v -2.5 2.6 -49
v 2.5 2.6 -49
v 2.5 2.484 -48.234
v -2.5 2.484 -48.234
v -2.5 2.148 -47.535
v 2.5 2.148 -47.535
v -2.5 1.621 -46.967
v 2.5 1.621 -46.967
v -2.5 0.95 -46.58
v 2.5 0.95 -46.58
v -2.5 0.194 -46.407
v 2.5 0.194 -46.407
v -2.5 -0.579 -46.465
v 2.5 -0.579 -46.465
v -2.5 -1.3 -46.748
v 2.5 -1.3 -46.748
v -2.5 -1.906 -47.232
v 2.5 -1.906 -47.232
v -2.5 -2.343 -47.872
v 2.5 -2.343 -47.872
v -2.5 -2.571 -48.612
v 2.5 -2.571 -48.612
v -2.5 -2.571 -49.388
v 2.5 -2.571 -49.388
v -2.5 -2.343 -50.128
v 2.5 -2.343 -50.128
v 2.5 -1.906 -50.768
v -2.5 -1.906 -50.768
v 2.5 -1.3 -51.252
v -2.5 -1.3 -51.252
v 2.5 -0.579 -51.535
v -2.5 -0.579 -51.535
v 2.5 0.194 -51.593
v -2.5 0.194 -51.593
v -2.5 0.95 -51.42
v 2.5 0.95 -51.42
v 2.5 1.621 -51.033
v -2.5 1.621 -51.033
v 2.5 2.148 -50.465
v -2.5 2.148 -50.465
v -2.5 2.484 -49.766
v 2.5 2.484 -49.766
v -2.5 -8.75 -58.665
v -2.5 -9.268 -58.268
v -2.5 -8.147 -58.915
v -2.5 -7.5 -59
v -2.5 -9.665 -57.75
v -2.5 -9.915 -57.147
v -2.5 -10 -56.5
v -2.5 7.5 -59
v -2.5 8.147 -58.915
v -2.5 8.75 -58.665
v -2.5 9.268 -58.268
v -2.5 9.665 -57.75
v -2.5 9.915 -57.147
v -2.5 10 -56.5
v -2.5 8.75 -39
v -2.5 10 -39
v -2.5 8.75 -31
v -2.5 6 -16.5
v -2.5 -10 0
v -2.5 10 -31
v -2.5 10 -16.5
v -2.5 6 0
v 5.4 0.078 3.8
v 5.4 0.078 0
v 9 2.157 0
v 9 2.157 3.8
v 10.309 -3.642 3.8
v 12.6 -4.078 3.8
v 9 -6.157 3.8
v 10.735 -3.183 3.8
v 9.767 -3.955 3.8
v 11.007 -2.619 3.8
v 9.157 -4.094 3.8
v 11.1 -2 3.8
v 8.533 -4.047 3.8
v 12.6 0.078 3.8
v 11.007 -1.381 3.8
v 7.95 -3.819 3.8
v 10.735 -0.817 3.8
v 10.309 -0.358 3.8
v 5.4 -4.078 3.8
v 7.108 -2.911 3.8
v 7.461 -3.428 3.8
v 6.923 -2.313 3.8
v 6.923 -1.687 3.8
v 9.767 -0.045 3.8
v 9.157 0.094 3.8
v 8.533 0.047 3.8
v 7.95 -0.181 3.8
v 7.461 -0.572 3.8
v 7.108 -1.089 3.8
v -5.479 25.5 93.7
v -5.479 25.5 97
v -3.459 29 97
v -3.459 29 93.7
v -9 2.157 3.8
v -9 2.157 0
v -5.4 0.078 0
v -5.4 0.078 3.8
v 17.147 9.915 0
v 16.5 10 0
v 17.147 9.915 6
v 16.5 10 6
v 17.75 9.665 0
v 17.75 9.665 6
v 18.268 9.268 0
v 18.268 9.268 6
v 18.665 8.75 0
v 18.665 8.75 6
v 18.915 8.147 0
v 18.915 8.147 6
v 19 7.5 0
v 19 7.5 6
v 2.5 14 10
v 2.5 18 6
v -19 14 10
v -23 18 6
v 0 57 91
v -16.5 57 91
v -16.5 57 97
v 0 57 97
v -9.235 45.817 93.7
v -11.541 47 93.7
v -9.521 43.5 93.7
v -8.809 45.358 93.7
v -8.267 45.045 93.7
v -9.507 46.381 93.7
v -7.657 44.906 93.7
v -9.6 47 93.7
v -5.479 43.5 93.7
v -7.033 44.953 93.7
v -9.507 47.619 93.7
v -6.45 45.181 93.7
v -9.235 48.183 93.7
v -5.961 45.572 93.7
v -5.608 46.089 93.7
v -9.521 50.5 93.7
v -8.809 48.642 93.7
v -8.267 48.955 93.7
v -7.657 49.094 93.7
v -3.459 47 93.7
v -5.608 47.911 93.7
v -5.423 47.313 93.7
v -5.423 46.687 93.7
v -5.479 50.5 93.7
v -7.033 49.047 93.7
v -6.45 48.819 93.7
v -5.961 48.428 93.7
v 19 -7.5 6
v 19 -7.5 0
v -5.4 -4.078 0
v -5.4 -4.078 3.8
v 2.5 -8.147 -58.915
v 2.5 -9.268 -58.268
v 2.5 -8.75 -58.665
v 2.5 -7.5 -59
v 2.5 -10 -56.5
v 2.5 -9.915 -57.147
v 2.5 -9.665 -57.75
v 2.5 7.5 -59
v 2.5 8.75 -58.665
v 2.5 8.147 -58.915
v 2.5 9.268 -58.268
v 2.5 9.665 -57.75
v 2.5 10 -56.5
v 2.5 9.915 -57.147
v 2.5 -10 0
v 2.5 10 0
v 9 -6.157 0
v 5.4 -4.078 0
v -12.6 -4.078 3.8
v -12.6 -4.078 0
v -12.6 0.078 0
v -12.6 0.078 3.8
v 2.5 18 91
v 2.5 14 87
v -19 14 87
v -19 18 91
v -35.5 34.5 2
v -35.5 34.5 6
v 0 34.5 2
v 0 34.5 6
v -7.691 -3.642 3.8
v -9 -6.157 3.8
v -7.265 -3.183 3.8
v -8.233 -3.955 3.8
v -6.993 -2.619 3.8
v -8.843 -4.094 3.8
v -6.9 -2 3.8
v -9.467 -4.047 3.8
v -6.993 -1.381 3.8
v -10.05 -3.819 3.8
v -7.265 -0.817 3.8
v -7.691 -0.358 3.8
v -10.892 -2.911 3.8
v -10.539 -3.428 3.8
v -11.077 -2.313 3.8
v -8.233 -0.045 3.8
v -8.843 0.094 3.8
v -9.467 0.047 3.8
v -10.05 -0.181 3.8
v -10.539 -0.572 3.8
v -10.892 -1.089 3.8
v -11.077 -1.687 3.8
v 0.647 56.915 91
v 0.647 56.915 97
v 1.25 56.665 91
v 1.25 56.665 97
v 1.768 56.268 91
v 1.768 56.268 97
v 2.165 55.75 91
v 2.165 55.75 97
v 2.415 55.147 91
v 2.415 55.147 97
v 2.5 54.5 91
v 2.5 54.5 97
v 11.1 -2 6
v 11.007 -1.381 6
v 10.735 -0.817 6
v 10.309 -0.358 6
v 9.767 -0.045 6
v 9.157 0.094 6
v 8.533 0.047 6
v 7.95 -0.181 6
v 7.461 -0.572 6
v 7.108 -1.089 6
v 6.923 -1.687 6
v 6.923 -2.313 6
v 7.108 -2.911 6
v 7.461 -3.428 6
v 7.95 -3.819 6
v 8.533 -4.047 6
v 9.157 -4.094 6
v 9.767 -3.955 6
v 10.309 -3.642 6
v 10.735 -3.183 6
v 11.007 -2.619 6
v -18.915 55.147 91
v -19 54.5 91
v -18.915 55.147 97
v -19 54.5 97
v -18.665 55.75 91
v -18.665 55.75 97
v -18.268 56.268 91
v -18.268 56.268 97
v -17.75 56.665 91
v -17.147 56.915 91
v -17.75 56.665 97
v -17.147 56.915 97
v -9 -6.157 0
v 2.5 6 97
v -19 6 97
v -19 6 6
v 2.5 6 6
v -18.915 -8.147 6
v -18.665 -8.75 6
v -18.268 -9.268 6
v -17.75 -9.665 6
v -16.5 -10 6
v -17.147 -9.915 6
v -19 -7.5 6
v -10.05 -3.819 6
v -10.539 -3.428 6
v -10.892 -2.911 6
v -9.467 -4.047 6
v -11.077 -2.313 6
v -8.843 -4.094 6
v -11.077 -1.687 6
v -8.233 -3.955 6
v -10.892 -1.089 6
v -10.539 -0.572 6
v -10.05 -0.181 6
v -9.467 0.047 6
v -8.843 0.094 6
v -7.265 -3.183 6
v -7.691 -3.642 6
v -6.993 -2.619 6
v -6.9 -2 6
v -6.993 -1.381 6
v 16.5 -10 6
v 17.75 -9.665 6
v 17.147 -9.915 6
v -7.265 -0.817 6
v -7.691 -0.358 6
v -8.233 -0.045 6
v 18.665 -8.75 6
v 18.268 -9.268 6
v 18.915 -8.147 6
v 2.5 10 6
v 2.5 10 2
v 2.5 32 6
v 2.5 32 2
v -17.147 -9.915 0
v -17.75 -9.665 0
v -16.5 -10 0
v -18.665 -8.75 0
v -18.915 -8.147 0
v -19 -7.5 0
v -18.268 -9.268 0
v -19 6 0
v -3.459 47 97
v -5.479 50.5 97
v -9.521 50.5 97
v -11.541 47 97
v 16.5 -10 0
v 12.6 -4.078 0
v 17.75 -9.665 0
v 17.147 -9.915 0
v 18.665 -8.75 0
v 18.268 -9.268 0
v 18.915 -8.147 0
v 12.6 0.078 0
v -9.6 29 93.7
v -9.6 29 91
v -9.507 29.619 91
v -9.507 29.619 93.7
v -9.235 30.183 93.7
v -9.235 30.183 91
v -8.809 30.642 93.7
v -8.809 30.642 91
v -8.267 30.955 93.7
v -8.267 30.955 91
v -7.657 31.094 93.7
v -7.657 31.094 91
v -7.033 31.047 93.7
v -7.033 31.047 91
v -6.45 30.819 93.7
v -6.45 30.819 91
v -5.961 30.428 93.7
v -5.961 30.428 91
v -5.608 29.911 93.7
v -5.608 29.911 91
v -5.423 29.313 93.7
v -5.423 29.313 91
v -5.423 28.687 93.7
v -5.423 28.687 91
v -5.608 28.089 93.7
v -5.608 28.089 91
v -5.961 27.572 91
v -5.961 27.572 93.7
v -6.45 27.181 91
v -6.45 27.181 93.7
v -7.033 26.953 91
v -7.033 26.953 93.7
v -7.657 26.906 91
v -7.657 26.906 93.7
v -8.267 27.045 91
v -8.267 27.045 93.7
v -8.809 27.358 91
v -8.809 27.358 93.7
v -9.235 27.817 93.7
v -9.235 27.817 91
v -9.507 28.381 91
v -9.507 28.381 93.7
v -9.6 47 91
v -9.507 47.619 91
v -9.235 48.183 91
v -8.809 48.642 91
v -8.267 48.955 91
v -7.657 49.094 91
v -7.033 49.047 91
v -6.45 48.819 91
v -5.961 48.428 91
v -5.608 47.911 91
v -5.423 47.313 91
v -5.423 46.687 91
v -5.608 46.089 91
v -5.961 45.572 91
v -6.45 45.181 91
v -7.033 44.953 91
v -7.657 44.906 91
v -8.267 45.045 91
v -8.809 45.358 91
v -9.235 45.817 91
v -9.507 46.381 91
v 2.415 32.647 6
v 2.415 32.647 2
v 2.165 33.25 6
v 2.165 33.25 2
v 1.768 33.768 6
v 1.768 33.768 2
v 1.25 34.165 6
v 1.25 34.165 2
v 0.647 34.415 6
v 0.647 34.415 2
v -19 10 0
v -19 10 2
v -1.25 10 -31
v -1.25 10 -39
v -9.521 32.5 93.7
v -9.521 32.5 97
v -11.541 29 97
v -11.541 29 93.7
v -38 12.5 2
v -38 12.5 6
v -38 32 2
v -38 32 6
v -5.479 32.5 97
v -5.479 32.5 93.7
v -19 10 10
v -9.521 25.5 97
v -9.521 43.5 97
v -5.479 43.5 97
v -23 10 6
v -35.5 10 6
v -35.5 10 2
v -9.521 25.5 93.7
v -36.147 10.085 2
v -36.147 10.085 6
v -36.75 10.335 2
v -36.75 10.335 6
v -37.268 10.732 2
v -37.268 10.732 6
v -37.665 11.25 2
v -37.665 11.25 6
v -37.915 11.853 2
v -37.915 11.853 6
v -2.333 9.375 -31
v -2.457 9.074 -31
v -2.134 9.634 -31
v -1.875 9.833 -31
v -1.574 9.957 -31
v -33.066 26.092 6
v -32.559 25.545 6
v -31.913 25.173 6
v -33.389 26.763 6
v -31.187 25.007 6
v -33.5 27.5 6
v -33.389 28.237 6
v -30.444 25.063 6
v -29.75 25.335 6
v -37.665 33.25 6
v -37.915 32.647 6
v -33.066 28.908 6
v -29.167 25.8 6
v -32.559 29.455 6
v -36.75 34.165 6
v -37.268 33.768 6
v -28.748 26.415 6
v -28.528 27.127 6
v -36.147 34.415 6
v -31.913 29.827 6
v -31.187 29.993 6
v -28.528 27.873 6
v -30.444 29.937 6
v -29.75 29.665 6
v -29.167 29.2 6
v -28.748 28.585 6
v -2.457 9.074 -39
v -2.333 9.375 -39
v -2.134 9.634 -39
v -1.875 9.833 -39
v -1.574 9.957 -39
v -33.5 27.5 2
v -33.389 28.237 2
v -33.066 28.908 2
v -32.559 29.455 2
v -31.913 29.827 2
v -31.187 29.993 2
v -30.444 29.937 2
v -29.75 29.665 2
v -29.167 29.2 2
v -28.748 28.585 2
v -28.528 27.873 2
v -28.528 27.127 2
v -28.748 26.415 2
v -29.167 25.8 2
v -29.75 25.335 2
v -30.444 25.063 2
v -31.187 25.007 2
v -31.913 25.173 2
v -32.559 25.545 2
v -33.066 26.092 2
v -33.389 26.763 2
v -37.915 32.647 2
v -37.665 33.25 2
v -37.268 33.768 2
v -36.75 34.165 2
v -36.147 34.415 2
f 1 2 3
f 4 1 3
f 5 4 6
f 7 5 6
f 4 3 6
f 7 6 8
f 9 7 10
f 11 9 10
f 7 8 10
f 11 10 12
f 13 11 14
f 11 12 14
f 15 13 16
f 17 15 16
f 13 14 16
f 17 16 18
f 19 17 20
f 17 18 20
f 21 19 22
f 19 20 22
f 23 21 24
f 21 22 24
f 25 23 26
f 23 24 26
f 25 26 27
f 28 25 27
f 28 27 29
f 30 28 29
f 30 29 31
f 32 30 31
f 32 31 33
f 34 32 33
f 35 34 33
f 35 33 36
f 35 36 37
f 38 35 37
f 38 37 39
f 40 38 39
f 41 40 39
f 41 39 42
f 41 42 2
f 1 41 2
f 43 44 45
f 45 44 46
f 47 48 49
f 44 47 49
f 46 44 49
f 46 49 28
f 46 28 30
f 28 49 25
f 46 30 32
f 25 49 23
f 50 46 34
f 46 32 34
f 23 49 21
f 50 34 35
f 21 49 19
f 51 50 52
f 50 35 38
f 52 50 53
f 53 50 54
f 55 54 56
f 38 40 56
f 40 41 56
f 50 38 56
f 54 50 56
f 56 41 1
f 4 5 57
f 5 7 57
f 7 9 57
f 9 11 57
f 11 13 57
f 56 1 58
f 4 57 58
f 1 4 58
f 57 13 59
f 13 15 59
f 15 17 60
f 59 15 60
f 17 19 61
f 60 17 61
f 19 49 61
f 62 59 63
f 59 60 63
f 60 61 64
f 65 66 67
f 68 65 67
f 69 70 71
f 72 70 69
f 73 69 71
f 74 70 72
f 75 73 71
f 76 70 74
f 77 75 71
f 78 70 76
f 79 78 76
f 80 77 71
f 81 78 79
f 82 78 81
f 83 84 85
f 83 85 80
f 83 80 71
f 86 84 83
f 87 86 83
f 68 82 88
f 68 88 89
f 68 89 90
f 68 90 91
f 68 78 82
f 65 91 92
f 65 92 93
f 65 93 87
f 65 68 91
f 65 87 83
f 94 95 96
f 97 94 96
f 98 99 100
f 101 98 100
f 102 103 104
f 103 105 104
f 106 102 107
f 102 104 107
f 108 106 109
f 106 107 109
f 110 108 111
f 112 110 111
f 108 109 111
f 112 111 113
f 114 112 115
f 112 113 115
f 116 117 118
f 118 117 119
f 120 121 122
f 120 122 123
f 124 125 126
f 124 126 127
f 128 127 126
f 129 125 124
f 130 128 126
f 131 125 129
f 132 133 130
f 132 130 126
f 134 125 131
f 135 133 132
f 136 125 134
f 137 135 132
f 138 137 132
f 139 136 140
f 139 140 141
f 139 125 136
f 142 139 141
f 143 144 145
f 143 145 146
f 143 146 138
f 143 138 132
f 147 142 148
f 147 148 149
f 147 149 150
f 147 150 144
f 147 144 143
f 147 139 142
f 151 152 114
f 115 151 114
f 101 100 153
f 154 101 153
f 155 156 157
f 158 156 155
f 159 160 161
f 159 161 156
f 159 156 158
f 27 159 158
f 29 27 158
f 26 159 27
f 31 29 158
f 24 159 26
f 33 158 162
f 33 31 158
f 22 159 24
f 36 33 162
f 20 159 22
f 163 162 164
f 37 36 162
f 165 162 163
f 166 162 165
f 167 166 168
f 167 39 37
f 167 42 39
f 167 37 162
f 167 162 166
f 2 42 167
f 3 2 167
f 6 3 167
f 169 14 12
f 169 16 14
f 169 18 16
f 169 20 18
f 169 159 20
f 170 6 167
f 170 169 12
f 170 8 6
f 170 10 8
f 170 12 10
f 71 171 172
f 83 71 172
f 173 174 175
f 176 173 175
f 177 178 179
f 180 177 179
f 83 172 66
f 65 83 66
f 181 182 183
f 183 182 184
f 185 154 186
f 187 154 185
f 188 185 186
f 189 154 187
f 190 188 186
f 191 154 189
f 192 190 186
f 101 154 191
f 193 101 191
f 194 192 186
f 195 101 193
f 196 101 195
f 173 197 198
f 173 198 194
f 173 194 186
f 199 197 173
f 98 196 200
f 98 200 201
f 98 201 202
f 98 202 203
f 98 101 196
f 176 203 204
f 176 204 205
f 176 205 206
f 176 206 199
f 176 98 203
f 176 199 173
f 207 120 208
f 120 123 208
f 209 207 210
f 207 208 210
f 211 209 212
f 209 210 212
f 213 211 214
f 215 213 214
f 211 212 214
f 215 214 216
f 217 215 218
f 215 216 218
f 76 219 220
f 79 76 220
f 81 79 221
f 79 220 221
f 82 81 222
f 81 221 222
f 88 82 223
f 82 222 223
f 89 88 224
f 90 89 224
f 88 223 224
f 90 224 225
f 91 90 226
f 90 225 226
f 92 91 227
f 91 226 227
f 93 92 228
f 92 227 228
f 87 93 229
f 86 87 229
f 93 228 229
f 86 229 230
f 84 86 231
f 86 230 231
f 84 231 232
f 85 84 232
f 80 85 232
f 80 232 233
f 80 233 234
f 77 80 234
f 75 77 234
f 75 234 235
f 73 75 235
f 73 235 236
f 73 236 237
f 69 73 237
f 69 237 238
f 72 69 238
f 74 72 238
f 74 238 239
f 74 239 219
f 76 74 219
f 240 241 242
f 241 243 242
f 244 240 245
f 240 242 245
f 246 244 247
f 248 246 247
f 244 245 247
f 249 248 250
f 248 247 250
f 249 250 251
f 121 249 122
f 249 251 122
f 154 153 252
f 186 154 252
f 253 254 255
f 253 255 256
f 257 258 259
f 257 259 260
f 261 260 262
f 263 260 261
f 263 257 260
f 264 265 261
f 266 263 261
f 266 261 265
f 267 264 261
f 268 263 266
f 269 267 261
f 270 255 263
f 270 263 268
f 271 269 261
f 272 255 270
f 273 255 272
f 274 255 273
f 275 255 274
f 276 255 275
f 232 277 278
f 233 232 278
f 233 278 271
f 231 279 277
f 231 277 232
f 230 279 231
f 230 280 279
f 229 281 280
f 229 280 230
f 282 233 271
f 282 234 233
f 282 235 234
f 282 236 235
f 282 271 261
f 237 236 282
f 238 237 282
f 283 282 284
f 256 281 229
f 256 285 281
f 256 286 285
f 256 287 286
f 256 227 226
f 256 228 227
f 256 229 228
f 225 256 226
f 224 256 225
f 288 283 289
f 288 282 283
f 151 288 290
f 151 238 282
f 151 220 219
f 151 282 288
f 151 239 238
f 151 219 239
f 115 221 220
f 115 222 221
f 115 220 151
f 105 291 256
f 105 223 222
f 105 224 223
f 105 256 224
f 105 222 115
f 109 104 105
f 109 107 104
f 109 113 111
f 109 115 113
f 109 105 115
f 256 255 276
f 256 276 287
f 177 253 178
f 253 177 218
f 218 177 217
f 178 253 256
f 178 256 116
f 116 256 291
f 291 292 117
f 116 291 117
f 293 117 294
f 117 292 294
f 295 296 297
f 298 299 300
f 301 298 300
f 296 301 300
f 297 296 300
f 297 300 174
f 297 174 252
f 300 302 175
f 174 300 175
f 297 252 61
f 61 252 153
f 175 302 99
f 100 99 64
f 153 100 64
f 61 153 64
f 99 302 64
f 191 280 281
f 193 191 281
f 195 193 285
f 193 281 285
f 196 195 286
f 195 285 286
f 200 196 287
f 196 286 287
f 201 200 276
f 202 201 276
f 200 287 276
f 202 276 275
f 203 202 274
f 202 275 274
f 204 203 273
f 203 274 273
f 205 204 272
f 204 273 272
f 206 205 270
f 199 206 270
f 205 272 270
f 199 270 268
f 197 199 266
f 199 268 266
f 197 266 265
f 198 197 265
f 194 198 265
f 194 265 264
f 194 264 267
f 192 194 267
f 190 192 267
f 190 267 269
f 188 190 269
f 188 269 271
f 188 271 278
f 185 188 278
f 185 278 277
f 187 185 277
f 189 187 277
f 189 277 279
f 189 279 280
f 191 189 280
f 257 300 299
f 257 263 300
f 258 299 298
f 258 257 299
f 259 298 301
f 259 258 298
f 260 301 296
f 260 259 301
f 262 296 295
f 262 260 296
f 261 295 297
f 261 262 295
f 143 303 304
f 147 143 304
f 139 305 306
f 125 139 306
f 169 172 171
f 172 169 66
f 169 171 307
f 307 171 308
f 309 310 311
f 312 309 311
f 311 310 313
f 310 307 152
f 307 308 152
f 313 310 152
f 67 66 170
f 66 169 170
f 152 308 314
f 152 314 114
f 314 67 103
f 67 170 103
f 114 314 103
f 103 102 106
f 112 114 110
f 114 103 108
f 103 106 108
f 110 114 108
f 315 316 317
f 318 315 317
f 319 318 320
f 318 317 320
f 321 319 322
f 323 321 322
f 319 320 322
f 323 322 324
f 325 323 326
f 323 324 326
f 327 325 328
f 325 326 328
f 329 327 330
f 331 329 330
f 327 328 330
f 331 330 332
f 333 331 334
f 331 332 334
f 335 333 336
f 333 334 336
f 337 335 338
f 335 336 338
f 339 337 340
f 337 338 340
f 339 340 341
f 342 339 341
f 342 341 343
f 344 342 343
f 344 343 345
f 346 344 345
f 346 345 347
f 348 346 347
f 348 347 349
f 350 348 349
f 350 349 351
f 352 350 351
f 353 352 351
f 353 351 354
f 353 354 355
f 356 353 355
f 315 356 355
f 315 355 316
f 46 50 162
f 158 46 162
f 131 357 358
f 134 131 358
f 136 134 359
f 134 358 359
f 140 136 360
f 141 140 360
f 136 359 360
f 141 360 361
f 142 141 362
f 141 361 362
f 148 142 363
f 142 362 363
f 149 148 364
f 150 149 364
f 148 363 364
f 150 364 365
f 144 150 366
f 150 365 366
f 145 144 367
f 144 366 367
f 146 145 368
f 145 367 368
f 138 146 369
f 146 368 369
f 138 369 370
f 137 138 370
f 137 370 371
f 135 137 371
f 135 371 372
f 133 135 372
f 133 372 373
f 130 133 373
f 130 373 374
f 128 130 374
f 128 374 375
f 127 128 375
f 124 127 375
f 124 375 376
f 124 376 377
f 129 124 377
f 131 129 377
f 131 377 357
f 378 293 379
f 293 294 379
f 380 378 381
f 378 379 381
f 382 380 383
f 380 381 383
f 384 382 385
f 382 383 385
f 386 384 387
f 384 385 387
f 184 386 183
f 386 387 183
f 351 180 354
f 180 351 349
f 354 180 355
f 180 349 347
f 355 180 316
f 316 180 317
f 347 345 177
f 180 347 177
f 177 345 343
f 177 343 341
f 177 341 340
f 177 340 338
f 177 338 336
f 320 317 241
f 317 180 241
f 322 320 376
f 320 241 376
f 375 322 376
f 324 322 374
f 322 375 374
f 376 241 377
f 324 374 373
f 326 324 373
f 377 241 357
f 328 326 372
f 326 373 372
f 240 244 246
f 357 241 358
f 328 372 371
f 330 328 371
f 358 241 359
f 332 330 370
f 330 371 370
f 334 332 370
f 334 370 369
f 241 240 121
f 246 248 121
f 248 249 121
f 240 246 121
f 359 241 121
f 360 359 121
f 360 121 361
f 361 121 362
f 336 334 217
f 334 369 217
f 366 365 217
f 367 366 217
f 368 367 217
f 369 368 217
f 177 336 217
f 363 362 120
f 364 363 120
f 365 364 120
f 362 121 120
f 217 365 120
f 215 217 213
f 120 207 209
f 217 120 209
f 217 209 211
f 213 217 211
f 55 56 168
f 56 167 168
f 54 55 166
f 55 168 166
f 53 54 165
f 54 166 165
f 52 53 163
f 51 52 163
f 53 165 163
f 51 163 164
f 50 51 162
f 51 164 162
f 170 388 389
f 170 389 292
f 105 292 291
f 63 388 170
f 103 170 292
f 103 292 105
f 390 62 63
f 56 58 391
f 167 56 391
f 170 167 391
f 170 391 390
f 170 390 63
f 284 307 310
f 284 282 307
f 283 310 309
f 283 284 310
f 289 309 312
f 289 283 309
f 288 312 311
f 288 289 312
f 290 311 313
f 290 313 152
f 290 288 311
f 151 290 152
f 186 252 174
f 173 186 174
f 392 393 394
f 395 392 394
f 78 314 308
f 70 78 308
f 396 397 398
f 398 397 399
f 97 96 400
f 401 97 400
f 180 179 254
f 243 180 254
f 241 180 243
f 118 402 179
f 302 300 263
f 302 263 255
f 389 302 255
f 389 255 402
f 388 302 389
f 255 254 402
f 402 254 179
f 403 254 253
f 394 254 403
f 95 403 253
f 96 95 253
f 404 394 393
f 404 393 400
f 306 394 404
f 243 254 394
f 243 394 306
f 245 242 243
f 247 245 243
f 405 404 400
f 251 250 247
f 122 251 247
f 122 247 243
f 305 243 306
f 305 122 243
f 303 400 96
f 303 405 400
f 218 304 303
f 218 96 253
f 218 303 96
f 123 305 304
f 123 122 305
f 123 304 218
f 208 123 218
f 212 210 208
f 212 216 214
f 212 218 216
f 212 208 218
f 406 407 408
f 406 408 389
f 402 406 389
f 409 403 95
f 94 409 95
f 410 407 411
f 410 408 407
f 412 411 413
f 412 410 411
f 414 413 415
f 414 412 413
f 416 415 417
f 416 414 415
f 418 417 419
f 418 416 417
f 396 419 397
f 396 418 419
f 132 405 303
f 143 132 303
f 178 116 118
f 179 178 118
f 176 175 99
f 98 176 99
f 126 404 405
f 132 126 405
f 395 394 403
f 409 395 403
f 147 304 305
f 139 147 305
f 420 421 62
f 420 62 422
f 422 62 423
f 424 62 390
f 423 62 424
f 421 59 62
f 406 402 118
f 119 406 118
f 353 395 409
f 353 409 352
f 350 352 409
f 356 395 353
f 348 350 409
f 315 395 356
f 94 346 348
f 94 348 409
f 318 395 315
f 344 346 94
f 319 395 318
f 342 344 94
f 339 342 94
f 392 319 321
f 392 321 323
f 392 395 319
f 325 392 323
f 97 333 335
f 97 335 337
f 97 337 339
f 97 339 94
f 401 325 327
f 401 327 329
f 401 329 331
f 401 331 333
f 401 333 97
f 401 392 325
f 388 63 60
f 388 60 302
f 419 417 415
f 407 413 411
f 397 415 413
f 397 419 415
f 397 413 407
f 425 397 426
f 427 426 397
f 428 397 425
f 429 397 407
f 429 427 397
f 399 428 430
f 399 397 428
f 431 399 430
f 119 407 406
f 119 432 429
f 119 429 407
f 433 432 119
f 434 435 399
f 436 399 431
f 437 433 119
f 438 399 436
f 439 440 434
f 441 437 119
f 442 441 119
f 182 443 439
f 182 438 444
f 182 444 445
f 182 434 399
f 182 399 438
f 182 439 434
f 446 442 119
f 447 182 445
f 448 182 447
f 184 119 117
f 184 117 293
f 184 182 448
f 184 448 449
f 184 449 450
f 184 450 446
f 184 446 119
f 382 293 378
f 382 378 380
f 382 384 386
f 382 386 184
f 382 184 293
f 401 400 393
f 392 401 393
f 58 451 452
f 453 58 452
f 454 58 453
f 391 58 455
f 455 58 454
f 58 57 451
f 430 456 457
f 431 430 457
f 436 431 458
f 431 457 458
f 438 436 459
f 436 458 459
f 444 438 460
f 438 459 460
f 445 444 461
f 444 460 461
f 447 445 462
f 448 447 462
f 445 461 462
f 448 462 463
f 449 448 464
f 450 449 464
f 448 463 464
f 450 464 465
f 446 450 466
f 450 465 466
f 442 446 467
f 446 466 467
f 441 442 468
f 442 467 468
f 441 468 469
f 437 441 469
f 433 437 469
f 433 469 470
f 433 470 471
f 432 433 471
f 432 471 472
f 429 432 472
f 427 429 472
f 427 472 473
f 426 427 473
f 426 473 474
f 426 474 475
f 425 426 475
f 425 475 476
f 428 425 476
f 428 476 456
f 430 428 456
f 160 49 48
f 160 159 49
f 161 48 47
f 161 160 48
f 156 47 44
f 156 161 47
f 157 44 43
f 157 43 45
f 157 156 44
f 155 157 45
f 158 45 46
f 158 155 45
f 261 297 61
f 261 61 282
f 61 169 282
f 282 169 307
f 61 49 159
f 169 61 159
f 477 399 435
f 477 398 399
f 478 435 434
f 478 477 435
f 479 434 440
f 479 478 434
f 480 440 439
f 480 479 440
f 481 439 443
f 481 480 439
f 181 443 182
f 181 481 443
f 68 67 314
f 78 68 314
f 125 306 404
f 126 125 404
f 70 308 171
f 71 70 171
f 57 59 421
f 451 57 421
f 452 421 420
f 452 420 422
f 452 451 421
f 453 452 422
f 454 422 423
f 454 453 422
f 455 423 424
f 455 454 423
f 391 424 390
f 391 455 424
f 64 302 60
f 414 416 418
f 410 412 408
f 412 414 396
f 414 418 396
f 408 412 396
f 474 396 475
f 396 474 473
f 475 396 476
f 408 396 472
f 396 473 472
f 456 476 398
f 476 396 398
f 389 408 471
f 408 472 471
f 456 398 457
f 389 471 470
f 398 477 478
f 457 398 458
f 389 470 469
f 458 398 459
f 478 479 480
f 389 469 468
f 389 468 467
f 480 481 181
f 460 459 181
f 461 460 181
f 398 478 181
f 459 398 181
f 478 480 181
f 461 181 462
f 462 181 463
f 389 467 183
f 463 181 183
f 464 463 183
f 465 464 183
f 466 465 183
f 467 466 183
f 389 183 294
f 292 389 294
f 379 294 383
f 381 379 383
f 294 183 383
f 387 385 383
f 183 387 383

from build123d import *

# Parameters (mm, degrees)
SKETCH_3_W          = 38
SKETCH_3_H          = 20
EXTRUDE_1_DEPTH     = 6
SKETCH_4_W          = 5
SKETCH_4_H          = 20
EXTRUDE_2_DEPTH     = 59
SKETCH_9_W          = 40.5
SKETCH_9_H          = 24.5
EXTRUDE_4_DEPTH     = 4
SKETCH_12_W         = 21.5
SKETCH_12_H         = 85
EXTRUDE_5_DEPTH     = 4
SKETCH_13_W         = 21.5
SKETCH_13_H         = 51
EXTRUDE_6_DEPTH     = 6
EXTRUDE_8_DEPTH     = 4
CUT_EXTRUDE_START   = -20
CUT_EXTRUDE_7_DEPTH = 8
SKETCH_5_R          = 2.1
CUT_EXTRUDE_1_DEPTH = 114.903467902
CUT_EXTRUDE_2_DEPTH = 3.8
SKETCH_7_R          = 2.6
CUT_EXTRUDE_3_DEPTH = 120.57529009
SKETCH_17_R         = 2.1
CUT_EXTRUDE_4_DEPTH = 165.903001792
CUT_EXTRUDE_5_DEPTH = 3.3
SKETCH_19_R         = 2.5
CUT_EXTRUDE_6_DEPTH = 118.123866056
FILLET_2_R          = 2.5
CHAMFER_2_SIZE      = 4


with BuildPart() as part:
    # Эскиз3 → Бобышка-Вытянуть1 (new body)
    with BuildSketch(Plane.XY):
        Rectangle(SKETCH_3_W, SKETCH_3_H)
    extrude(amount=EXTRUDE_1_DEPTH)

    # Эскиз4 → Бобышка-Вытянуть2 (add)
    with BuildSketch(Plane(origin=(-10.8, 0, 0), x_dir=(1, 0, 0), z_dir=(0, 0, 1))):
        with Locations((10.8, 0)):
            Rectangle(SKETCH_4_W, SKETCH_4_H)
    extrude(amount=-EXTRUDE_2_DEPTH)

    # Эскиз9 → Бобышка-Вытянуть4 (add)
    with BuildSketch(Plane.XY.offset(6)):
        with Locations((-17.75, 22.25)):
            Rectangle(SKETCH_9_W, SKETCH_9_H)
    extrude(amount=-EXTRUDE_4_DEPTH)

    # Эскиз12 → Бобышка-Вытянуть5 (add, symmetric)
    with BuildSketch(Plane(origin=(0, 10, 0), x_dir=(-1, 0, 0), z_dir=(0, 1, 0))):
        with Locations((8.25, 48.5)):
            Rectangle(SKETCH_12_W, SKETCH_12_H)
    extrude(amount=EXTRUDE_5_DEPTH, both=True)

    # Эскиз13 → Бобышка-Вытянуть6 (add)
    with BuildSketch(Plane.XY.offset(91)):
        with Locations((-8.25, 31.5)):
            Rectangle(SKETCH_13_W, SKETCH_13_H)
    extrude(amount=EXTRUDE_6_DEPTH)

    # Эскиз23 → Бобышка-Вытянуть8 (add)
    with BuildSketch(Plane(origin=(0, 10, 0), x_dir=(1, 0, 0), z_dir=(0, 1, 0))):
        Polygon((-2.5, 16.5), (-19, 0), (-2.5, 0), align=None)
    extrude(amount=-EXTRUDE_8_DEPTH)

    # Эскиз21 → Вырез-Вытянуть7 (cut)
    with BuildSketch(Plane(origin=(0, 0, -59), x_dir=(-1, 0, 0), z_dir=(0, 0, -1)).offset(CUT_EXTRUDE_START)):
        with BuildLine():
            Line((1.25, 10), (2.5, 10))
            Line((2.5, 10), (2.5, 8.75))
            ThreePointArc((2.5, 8.75), (2.133883476, 9.633883476), (1.25, 10))
        make_face()
    extrude(amount=-CUT_EXTRUDE_7_DEPTH, mode=Mode.SUBTRACT)

    # Эскиз5 → Вырез-Вытянуть1 (cut, through all)
    with BuildSketch(Plane.XY.offset(6)):
        with Locations((-9, -2)):
            Circle(SKETCH_5_R)
        with Locations((9, -2)):
            Circle(SKETCH_5_R)
    extrude(amount=-CUT_EXTRUDE_1_DEPTH, mode=Mode.SUBTRACT)

    # Эскиз6 → Вырез-Вытянуть2 (cut)
    with BuildSketch(Plane(origin=(0, 0, 0), x_dir=(-1, 0, 0), z_dir=(0, 0, -1))):
        Polygon((-9, 2.156921938), (-12.6, 0.078460969), (-12.6, -4.078460969), (-9, -6.156921938), (-5.4, -4.078460969), (-5.4, 0.078460969), align=None)
        Polygon((9, 2.156921938), (5.4, 0.078460969), (5.4, -4.078460969), (9, -6.156921938), (12.6, -4.078460969), (12.6, 0.078460969), align=None)
    extrude(amount=-CUT_EXTRUDE_2_DEPTH, mode=Mode.SUBTRACT)

    # Эскиз7 → Вырез-Вытянуть3 (cut, through all)
    with BuildSketch(Plane(origin=(2.5, 0, 0), x_dir=(0, 0, -1), z_dir=(1, 0, 0))):
        with Locations(Location((49, 0, 0), (0, 0, 90))):
            Circle(SKETCH_7_R)
    extrude(amount=-CUT_EXTRUDE_3_DEPTH, mode=Mode.SUBTRACT)

    # Эскиз17 → Вырез-Вытянуть4 (cut, through all)
    with BuildSketch(Plane(origin=(0, 0, 91), x_dir=(-1, 0, 0), z_dir=(0, 0, -1))):
        with Locations((7.5, 29)):
            Circle(SKETCH_17_R)
        with Locations((7.5, 47)):
            Circle(SKETCH_17_R)
    extrude(amount=-CUT_EXTRUDE_4_DEPTH, mode=Mode.SUBTRACT)

    # Эскиз18 → Вырез-Вытянуть5 (cut)
    with BuildSketch(Plane.XY.offset(97)):
        Polygon((-3.458548116, 29), (-5.479274058, 32.5), (-9.520725942, 32.5), (-11.541451884, 29), (-9.520725942, 25.5), (-5.479274058, 25.5), align=None)
        Polygon((-3.458548116, 47), (-5.479274058, 50.5), (-9.520725942, 50.5), (-11.541451884, 47), (-9.520725942, 43.5), (-5.479274058, 43.5), align=None)
    extrude(amount=-CUT_EXTRUDE_5_DEPTH, mode=Mode.SUBTRACT)

    # Эскиз19 → Вырез-Вытянуть6 (cut, through all)
    with BuildSketch(Plane(origin=(0, 0, 2), x_dir=(-1, 0, 0), z_dir=(0, 0, -1))):
        with Locations((30.999999999, 27.499999999)):
            Circle(SKETCH_19_R)
    extrude(amount=-CUT_EXTRUDE_6_DEPTH, mode=Mode.SUBTRACT)

    # Скругление2
    fillet_2_edges = [part.edges().sort_by_distance(p)[0] for p in [
        (0, 10, -59),
        (0, -10, -59),
        (2.5, 34.5, 4),
        (-38, 10, 4),
        (-38, 34.5, 4),
        (2.5, 57, 94),
        (-19, 57, 94),
        (19, 10, 3),
        (19, -10, 3),
        (-19, -10, 3),
    ]]
    fillet(fillet_2_edges, radius=FILLET_2_R)

    # Фаска2
    chamfer_2_edges = [part.edges().sort_by_distance(p)[0] for p in [
        (-19, 12, 6),
        (-8.25, 14, 91),
        (-8.25, 14, 6),
    ]]
    chamfer(chamfer_2_edges, length=CHAMFER_2_SIZE)


solid = part.part
